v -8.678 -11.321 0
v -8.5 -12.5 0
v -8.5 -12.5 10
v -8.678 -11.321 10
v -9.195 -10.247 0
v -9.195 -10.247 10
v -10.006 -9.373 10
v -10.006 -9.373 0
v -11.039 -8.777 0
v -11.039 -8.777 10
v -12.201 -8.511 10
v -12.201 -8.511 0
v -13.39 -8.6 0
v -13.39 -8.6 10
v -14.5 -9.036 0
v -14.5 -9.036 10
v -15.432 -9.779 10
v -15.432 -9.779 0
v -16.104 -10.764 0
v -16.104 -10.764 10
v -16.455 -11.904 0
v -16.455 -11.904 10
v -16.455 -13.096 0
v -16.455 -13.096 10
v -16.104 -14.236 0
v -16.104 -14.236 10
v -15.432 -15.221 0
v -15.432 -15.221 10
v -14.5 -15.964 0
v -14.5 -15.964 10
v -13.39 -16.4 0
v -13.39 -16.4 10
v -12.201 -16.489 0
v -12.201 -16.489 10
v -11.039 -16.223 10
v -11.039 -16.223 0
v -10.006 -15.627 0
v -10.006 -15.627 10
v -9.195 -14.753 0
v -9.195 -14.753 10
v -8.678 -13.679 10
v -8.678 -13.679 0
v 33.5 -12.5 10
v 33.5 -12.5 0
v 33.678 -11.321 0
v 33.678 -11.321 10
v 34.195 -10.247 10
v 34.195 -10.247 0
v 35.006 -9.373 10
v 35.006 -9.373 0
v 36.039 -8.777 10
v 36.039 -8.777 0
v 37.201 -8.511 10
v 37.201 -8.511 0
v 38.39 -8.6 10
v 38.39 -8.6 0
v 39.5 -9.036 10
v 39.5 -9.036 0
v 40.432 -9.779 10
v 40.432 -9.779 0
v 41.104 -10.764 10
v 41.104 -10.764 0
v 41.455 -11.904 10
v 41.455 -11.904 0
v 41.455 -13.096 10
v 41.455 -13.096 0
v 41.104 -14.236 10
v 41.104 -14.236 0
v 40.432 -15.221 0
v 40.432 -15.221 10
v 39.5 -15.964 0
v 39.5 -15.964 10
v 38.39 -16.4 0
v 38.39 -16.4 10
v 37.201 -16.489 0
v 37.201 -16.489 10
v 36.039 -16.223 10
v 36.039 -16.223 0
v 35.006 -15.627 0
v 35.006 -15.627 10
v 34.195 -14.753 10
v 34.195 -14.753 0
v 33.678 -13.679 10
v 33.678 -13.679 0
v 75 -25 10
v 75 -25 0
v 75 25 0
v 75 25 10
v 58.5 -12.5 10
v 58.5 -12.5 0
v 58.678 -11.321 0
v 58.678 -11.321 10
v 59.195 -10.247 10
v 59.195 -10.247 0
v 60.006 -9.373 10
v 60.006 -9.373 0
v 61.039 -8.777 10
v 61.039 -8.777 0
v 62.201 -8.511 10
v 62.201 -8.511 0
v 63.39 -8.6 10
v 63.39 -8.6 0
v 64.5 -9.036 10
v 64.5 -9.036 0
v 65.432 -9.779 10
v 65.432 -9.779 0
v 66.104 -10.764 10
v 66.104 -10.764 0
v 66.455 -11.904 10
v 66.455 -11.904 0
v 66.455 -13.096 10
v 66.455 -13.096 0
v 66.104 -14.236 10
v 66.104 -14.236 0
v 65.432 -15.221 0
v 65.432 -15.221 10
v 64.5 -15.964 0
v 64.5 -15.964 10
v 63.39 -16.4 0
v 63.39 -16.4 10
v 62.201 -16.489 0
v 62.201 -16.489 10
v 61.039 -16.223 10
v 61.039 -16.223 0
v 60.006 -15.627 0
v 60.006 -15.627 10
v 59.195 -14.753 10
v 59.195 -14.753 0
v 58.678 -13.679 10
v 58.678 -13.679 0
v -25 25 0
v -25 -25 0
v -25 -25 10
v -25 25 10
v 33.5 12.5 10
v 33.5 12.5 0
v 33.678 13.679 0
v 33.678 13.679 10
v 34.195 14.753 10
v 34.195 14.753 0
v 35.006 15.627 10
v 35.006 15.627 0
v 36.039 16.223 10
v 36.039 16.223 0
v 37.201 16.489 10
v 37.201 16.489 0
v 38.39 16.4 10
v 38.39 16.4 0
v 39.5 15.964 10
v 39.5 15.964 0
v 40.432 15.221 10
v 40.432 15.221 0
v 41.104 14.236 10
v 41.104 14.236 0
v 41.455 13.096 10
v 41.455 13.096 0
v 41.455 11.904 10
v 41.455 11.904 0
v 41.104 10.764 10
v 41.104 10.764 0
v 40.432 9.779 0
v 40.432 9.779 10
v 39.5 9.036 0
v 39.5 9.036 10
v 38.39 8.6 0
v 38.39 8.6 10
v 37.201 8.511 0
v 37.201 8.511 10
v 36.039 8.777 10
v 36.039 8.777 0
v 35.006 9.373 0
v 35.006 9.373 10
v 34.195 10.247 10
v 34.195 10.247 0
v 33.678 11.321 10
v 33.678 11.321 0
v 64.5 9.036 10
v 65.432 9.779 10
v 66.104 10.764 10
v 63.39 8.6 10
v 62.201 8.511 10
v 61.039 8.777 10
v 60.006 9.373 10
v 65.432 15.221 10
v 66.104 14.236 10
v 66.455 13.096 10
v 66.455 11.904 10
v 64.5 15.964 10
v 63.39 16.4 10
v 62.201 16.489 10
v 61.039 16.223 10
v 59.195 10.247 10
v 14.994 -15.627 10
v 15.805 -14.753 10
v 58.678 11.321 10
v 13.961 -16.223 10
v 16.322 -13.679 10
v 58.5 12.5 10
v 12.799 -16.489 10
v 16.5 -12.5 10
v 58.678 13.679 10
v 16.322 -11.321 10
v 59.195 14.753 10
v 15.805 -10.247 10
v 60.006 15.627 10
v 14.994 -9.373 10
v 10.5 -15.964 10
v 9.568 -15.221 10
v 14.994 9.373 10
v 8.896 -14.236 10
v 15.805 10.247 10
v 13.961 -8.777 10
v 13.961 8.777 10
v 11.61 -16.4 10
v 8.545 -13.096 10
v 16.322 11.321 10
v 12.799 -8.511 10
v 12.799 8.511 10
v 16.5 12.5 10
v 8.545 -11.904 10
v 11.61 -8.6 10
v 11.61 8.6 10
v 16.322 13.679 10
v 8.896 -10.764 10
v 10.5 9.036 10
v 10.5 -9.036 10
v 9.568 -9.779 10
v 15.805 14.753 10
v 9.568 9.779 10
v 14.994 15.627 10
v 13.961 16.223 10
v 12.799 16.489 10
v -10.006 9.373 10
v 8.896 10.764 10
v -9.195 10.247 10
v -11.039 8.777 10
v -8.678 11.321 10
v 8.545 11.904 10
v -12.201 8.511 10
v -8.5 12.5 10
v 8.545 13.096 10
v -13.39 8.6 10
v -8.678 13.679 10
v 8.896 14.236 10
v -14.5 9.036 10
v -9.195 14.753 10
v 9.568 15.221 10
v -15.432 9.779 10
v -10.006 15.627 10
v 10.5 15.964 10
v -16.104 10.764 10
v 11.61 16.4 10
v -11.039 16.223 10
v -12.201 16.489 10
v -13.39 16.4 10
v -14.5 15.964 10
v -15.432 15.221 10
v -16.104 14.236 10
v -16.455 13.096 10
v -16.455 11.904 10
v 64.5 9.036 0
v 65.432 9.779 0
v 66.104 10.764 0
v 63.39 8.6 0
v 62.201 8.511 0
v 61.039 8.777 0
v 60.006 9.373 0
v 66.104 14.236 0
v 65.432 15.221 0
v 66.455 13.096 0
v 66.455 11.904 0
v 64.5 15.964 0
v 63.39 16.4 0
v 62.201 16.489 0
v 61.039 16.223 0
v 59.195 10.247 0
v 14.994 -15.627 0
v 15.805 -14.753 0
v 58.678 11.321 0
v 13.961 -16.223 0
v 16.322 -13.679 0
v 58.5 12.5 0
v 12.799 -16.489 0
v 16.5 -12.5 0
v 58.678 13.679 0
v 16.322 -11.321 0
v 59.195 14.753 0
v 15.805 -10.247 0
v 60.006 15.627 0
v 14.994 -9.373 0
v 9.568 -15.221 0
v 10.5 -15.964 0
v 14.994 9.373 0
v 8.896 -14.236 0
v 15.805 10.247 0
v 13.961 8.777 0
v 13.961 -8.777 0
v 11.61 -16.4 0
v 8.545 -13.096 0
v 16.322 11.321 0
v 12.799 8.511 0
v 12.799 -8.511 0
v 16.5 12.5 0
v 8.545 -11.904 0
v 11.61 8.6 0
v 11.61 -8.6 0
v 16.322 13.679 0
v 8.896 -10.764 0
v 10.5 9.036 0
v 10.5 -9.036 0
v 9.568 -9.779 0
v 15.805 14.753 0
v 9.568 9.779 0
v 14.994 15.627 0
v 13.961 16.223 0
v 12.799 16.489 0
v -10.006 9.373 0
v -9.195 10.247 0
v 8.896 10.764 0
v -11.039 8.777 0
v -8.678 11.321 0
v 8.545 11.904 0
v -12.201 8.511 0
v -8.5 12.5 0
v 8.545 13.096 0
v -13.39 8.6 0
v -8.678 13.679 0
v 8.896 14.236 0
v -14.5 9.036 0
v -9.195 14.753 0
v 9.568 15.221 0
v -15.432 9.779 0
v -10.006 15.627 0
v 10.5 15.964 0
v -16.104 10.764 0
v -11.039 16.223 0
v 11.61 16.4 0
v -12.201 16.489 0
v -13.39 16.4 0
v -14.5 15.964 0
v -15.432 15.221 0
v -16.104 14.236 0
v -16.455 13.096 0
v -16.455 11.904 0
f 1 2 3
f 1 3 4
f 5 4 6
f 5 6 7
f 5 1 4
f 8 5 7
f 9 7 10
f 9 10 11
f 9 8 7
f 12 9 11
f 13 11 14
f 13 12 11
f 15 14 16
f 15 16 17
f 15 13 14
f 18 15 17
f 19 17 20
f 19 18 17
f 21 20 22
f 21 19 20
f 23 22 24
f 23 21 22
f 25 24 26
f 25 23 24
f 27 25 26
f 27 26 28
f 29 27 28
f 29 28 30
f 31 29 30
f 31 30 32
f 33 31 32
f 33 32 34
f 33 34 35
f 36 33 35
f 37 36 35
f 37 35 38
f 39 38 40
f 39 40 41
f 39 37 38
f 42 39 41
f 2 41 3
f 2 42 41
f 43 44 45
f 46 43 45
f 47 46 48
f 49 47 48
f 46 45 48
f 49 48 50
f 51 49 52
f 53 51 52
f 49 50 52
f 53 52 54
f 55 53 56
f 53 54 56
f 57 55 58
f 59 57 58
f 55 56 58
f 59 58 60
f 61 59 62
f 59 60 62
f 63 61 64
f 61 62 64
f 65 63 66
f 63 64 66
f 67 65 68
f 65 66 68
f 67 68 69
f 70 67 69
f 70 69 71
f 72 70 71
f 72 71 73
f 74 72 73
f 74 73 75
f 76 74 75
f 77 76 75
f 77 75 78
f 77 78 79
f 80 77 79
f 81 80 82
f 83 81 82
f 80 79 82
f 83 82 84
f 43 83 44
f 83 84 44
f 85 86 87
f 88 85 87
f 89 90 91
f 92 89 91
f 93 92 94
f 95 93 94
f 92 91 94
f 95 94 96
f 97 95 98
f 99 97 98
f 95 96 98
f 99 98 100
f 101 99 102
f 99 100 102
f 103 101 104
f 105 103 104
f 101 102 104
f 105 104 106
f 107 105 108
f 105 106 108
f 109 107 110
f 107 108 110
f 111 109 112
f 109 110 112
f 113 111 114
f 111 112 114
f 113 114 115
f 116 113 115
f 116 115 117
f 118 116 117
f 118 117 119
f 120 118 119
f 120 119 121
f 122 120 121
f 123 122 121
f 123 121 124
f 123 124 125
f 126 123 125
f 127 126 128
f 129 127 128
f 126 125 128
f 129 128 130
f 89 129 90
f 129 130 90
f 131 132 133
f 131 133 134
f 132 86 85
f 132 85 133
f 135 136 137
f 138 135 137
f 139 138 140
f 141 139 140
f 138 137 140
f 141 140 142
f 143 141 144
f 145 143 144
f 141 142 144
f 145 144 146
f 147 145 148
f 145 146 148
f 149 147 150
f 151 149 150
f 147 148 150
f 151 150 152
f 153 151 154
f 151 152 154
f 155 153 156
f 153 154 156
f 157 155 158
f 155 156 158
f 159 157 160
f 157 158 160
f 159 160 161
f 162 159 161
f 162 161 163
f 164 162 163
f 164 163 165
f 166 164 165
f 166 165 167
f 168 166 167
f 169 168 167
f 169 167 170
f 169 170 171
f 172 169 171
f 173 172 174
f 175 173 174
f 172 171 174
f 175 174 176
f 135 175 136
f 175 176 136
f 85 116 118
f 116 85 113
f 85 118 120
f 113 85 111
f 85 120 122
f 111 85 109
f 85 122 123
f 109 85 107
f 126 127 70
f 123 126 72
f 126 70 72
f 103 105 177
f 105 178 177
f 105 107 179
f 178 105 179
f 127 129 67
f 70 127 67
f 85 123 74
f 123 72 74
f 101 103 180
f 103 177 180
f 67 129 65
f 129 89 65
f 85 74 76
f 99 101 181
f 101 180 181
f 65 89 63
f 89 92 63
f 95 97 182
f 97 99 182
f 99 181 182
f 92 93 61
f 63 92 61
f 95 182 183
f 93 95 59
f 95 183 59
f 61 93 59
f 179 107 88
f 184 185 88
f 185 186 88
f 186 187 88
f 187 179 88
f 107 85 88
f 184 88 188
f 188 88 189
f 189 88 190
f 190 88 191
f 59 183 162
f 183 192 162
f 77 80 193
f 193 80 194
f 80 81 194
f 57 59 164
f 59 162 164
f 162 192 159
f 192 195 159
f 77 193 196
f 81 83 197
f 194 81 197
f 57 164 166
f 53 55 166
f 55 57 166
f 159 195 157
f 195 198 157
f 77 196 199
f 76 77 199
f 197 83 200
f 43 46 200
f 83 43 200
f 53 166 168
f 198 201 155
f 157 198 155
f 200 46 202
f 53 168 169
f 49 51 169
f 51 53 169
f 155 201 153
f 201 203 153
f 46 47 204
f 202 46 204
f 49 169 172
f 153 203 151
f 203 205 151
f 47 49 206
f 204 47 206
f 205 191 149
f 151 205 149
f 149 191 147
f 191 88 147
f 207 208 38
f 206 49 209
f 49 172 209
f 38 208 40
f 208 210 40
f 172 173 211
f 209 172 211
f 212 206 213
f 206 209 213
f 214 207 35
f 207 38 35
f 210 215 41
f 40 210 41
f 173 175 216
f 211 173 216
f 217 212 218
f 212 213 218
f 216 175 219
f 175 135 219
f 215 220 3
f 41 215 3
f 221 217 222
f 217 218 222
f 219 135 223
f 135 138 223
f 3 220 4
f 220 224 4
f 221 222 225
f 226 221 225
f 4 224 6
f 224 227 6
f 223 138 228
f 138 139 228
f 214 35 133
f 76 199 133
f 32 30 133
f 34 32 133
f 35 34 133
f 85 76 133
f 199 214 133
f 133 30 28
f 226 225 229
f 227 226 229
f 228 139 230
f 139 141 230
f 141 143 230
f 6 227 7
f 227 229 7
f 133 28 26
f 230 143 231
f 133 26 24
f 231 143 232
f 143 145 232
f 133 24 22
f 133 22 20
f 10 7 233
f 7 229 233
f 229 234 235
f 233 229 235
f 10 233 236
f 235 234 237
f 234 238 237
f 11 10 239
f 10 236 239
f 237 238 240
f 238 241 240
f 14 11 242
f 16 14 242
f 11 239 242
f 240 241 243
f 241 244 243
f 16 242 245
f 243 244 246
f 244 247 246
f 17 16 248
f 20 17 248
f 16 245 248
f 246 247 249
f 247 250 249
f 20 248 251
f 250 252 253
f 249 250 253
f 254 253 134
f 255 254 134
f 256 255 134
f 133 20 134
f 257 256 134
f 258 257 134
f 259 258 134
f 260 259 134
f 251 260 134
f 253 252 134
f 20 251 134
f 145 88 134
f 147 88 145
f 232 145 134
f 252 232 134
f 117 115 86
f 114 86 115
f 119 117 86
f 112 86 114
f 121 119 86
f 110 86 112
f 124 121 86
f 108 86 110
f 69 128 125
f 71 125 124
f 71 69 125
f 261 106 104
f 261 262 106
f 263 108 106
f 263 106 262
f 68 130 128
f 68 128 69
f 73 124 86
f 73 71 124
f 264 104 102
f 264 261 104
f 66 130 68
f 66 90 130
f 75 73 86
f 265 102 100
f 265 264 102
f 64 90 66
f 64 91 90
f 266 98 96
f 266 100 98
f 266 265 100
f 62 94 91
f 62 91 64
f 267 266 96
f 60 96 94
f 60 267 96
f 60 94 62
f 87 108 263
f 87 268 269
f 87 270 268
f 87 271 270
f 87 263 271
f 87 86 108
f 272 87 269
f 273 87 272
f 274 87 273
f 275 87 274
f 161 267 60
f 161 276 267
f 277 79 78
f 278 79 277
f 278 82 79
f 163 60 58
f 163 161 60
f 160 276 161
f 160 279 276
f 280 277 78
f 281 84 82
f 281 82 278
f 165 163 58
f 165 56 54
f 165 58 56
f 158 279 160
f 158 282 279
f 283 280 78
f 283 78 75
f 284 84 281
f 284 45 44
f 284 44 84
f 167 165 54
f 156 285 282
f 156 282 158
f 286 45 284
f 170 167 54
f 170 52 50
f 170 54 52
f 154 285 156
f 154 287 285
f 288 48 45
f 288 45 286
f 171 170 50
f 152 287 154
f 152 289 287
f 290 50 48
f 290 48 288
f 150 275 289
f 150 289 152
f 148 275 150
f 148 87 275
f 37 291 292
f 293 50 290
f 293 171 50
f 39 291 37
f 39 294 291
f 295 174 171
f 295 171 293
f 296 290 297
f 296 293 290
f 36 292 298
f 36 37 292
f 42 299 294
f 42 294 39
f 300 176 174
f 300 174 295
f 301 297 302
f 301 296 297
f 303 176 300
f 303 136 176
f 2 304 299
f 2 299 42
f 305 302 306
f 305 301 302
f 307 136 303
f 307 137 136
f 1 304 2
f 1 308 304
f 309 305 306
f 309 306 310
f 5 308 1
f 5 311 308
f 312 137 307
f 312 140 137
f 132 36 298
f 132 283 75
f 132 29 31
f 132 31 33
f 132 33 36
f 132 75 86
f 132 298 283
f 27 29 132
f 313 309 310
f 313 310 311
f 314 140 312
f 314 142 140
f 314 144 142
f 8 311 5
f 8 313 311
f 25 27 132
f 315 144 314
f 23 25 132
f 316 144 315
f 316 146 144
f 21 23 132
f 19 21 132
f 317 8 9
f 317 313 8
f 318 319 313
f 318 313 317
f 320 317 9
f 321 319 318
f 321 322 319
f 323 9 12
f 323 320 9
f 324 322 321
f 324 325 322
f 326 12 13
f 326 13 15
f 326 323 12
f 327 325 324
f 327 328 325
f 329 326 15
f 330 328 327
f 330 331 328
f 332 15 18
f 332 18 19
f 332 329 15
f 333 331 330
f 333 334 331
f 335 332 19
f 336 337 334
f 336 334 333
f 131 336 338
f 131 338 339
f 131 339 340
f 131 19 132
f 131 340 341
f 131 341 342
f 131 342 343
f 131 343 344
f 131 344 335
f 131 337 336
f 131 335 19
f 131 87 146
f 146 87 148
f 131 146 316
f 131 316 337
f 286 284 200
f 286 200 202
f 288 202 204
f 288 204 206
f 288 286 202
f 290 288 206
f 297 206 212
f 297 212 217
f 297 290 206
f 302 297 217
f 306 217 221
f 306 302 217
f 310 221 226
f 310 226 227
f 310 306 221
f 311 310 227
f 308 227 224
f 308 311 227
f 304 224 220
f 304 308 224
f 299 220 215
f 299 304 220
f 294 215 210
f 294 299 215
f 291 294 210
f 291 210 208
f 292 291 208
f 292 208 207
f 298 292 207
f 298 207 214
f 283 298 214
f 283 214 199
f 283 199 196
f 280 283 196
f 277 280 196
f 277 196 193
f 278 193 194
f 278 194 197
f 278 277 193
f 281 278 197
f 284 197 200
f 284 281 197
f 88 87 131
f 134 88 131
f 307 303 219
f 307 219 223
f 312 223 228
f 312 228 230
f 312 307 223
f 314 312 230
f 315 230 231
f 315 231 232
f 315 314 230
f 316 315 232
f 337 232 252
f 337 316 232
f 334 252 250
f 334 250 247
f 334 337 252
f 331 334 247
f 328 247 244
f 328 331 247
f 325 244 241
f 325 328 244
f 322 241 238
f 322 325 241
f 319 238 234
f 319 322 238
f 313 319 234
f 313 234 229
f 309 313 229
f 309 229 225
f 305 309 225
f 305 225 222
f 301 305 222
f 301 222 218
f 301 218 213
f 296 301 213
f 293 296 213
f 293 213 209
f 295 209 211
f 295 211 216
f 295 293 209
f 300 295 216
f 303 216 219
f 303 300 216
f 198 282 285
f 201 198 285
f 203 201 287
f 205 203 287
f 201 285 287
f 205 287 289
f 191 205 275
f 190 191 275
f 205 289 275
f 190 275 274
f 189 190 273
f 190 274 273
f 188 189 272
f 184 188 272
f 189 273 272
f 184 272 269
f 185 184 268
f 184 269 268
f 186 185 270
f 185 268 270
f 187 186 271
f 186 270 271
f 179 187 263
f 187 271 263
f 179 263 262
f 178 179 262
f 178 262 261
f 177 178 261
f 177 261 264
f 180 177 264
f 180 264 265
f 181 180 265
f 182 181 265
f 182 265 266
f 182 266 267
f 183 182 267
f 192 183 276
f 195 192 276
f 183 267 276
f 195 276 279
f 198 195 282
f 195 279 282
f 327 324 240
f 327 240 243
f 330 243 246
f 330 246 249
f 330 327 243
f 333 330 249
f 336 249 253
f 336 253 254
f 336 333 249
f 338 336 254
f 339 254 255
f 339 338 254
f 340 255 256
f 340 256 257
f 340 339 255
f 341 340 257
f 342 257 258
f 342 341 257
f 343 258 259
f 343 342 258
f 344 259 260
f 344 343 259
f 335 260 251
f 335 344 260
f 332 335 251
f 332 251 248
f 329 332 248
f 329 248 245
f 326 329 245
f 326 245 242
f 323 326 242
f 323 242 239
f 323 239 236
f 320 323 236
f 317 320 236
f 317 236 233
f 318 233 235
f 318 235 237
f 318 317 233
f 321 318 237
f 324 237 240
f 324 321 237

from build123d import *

# Parameters (mm, degrees)
SKETCH_W  = 50
SKETCH_H  = 50
SKETCH_R  = 4
PAD_DEPTH = 10


with BuildPart() as part:
    # Sketch → Pad (new body)
    with BuildSketch(Plane.XY):
        Rectangle(SKETCH_W, SKETCH_H)
        with Locations((12.5, 12.5)):
            Circle(SKETCH_R, mode=Mode.SUBTRACT)
        with Locations((-12.5, 12.5)):
            Circle(SKETCH_R, mode=Mode.SUBTRACT)
        with Locations((12.5, -12.5)):
            Circle(SKETCH_R, mode=Mode.SUBTRACT)
        with Locations((-12.5, -12.5)):
            Circle(SKETCH_R, mode=Mode.SUBTRACT)
    pad = extrude(amount=PAD_DEPTH)

    # Mirrored: Pad across face of Pad
    add(pad.mirror(Plane(origin=(25, 0, 5), x_dir=(0, 1, 0), z_dir=(1, 0, 0))))


solid = part.part
